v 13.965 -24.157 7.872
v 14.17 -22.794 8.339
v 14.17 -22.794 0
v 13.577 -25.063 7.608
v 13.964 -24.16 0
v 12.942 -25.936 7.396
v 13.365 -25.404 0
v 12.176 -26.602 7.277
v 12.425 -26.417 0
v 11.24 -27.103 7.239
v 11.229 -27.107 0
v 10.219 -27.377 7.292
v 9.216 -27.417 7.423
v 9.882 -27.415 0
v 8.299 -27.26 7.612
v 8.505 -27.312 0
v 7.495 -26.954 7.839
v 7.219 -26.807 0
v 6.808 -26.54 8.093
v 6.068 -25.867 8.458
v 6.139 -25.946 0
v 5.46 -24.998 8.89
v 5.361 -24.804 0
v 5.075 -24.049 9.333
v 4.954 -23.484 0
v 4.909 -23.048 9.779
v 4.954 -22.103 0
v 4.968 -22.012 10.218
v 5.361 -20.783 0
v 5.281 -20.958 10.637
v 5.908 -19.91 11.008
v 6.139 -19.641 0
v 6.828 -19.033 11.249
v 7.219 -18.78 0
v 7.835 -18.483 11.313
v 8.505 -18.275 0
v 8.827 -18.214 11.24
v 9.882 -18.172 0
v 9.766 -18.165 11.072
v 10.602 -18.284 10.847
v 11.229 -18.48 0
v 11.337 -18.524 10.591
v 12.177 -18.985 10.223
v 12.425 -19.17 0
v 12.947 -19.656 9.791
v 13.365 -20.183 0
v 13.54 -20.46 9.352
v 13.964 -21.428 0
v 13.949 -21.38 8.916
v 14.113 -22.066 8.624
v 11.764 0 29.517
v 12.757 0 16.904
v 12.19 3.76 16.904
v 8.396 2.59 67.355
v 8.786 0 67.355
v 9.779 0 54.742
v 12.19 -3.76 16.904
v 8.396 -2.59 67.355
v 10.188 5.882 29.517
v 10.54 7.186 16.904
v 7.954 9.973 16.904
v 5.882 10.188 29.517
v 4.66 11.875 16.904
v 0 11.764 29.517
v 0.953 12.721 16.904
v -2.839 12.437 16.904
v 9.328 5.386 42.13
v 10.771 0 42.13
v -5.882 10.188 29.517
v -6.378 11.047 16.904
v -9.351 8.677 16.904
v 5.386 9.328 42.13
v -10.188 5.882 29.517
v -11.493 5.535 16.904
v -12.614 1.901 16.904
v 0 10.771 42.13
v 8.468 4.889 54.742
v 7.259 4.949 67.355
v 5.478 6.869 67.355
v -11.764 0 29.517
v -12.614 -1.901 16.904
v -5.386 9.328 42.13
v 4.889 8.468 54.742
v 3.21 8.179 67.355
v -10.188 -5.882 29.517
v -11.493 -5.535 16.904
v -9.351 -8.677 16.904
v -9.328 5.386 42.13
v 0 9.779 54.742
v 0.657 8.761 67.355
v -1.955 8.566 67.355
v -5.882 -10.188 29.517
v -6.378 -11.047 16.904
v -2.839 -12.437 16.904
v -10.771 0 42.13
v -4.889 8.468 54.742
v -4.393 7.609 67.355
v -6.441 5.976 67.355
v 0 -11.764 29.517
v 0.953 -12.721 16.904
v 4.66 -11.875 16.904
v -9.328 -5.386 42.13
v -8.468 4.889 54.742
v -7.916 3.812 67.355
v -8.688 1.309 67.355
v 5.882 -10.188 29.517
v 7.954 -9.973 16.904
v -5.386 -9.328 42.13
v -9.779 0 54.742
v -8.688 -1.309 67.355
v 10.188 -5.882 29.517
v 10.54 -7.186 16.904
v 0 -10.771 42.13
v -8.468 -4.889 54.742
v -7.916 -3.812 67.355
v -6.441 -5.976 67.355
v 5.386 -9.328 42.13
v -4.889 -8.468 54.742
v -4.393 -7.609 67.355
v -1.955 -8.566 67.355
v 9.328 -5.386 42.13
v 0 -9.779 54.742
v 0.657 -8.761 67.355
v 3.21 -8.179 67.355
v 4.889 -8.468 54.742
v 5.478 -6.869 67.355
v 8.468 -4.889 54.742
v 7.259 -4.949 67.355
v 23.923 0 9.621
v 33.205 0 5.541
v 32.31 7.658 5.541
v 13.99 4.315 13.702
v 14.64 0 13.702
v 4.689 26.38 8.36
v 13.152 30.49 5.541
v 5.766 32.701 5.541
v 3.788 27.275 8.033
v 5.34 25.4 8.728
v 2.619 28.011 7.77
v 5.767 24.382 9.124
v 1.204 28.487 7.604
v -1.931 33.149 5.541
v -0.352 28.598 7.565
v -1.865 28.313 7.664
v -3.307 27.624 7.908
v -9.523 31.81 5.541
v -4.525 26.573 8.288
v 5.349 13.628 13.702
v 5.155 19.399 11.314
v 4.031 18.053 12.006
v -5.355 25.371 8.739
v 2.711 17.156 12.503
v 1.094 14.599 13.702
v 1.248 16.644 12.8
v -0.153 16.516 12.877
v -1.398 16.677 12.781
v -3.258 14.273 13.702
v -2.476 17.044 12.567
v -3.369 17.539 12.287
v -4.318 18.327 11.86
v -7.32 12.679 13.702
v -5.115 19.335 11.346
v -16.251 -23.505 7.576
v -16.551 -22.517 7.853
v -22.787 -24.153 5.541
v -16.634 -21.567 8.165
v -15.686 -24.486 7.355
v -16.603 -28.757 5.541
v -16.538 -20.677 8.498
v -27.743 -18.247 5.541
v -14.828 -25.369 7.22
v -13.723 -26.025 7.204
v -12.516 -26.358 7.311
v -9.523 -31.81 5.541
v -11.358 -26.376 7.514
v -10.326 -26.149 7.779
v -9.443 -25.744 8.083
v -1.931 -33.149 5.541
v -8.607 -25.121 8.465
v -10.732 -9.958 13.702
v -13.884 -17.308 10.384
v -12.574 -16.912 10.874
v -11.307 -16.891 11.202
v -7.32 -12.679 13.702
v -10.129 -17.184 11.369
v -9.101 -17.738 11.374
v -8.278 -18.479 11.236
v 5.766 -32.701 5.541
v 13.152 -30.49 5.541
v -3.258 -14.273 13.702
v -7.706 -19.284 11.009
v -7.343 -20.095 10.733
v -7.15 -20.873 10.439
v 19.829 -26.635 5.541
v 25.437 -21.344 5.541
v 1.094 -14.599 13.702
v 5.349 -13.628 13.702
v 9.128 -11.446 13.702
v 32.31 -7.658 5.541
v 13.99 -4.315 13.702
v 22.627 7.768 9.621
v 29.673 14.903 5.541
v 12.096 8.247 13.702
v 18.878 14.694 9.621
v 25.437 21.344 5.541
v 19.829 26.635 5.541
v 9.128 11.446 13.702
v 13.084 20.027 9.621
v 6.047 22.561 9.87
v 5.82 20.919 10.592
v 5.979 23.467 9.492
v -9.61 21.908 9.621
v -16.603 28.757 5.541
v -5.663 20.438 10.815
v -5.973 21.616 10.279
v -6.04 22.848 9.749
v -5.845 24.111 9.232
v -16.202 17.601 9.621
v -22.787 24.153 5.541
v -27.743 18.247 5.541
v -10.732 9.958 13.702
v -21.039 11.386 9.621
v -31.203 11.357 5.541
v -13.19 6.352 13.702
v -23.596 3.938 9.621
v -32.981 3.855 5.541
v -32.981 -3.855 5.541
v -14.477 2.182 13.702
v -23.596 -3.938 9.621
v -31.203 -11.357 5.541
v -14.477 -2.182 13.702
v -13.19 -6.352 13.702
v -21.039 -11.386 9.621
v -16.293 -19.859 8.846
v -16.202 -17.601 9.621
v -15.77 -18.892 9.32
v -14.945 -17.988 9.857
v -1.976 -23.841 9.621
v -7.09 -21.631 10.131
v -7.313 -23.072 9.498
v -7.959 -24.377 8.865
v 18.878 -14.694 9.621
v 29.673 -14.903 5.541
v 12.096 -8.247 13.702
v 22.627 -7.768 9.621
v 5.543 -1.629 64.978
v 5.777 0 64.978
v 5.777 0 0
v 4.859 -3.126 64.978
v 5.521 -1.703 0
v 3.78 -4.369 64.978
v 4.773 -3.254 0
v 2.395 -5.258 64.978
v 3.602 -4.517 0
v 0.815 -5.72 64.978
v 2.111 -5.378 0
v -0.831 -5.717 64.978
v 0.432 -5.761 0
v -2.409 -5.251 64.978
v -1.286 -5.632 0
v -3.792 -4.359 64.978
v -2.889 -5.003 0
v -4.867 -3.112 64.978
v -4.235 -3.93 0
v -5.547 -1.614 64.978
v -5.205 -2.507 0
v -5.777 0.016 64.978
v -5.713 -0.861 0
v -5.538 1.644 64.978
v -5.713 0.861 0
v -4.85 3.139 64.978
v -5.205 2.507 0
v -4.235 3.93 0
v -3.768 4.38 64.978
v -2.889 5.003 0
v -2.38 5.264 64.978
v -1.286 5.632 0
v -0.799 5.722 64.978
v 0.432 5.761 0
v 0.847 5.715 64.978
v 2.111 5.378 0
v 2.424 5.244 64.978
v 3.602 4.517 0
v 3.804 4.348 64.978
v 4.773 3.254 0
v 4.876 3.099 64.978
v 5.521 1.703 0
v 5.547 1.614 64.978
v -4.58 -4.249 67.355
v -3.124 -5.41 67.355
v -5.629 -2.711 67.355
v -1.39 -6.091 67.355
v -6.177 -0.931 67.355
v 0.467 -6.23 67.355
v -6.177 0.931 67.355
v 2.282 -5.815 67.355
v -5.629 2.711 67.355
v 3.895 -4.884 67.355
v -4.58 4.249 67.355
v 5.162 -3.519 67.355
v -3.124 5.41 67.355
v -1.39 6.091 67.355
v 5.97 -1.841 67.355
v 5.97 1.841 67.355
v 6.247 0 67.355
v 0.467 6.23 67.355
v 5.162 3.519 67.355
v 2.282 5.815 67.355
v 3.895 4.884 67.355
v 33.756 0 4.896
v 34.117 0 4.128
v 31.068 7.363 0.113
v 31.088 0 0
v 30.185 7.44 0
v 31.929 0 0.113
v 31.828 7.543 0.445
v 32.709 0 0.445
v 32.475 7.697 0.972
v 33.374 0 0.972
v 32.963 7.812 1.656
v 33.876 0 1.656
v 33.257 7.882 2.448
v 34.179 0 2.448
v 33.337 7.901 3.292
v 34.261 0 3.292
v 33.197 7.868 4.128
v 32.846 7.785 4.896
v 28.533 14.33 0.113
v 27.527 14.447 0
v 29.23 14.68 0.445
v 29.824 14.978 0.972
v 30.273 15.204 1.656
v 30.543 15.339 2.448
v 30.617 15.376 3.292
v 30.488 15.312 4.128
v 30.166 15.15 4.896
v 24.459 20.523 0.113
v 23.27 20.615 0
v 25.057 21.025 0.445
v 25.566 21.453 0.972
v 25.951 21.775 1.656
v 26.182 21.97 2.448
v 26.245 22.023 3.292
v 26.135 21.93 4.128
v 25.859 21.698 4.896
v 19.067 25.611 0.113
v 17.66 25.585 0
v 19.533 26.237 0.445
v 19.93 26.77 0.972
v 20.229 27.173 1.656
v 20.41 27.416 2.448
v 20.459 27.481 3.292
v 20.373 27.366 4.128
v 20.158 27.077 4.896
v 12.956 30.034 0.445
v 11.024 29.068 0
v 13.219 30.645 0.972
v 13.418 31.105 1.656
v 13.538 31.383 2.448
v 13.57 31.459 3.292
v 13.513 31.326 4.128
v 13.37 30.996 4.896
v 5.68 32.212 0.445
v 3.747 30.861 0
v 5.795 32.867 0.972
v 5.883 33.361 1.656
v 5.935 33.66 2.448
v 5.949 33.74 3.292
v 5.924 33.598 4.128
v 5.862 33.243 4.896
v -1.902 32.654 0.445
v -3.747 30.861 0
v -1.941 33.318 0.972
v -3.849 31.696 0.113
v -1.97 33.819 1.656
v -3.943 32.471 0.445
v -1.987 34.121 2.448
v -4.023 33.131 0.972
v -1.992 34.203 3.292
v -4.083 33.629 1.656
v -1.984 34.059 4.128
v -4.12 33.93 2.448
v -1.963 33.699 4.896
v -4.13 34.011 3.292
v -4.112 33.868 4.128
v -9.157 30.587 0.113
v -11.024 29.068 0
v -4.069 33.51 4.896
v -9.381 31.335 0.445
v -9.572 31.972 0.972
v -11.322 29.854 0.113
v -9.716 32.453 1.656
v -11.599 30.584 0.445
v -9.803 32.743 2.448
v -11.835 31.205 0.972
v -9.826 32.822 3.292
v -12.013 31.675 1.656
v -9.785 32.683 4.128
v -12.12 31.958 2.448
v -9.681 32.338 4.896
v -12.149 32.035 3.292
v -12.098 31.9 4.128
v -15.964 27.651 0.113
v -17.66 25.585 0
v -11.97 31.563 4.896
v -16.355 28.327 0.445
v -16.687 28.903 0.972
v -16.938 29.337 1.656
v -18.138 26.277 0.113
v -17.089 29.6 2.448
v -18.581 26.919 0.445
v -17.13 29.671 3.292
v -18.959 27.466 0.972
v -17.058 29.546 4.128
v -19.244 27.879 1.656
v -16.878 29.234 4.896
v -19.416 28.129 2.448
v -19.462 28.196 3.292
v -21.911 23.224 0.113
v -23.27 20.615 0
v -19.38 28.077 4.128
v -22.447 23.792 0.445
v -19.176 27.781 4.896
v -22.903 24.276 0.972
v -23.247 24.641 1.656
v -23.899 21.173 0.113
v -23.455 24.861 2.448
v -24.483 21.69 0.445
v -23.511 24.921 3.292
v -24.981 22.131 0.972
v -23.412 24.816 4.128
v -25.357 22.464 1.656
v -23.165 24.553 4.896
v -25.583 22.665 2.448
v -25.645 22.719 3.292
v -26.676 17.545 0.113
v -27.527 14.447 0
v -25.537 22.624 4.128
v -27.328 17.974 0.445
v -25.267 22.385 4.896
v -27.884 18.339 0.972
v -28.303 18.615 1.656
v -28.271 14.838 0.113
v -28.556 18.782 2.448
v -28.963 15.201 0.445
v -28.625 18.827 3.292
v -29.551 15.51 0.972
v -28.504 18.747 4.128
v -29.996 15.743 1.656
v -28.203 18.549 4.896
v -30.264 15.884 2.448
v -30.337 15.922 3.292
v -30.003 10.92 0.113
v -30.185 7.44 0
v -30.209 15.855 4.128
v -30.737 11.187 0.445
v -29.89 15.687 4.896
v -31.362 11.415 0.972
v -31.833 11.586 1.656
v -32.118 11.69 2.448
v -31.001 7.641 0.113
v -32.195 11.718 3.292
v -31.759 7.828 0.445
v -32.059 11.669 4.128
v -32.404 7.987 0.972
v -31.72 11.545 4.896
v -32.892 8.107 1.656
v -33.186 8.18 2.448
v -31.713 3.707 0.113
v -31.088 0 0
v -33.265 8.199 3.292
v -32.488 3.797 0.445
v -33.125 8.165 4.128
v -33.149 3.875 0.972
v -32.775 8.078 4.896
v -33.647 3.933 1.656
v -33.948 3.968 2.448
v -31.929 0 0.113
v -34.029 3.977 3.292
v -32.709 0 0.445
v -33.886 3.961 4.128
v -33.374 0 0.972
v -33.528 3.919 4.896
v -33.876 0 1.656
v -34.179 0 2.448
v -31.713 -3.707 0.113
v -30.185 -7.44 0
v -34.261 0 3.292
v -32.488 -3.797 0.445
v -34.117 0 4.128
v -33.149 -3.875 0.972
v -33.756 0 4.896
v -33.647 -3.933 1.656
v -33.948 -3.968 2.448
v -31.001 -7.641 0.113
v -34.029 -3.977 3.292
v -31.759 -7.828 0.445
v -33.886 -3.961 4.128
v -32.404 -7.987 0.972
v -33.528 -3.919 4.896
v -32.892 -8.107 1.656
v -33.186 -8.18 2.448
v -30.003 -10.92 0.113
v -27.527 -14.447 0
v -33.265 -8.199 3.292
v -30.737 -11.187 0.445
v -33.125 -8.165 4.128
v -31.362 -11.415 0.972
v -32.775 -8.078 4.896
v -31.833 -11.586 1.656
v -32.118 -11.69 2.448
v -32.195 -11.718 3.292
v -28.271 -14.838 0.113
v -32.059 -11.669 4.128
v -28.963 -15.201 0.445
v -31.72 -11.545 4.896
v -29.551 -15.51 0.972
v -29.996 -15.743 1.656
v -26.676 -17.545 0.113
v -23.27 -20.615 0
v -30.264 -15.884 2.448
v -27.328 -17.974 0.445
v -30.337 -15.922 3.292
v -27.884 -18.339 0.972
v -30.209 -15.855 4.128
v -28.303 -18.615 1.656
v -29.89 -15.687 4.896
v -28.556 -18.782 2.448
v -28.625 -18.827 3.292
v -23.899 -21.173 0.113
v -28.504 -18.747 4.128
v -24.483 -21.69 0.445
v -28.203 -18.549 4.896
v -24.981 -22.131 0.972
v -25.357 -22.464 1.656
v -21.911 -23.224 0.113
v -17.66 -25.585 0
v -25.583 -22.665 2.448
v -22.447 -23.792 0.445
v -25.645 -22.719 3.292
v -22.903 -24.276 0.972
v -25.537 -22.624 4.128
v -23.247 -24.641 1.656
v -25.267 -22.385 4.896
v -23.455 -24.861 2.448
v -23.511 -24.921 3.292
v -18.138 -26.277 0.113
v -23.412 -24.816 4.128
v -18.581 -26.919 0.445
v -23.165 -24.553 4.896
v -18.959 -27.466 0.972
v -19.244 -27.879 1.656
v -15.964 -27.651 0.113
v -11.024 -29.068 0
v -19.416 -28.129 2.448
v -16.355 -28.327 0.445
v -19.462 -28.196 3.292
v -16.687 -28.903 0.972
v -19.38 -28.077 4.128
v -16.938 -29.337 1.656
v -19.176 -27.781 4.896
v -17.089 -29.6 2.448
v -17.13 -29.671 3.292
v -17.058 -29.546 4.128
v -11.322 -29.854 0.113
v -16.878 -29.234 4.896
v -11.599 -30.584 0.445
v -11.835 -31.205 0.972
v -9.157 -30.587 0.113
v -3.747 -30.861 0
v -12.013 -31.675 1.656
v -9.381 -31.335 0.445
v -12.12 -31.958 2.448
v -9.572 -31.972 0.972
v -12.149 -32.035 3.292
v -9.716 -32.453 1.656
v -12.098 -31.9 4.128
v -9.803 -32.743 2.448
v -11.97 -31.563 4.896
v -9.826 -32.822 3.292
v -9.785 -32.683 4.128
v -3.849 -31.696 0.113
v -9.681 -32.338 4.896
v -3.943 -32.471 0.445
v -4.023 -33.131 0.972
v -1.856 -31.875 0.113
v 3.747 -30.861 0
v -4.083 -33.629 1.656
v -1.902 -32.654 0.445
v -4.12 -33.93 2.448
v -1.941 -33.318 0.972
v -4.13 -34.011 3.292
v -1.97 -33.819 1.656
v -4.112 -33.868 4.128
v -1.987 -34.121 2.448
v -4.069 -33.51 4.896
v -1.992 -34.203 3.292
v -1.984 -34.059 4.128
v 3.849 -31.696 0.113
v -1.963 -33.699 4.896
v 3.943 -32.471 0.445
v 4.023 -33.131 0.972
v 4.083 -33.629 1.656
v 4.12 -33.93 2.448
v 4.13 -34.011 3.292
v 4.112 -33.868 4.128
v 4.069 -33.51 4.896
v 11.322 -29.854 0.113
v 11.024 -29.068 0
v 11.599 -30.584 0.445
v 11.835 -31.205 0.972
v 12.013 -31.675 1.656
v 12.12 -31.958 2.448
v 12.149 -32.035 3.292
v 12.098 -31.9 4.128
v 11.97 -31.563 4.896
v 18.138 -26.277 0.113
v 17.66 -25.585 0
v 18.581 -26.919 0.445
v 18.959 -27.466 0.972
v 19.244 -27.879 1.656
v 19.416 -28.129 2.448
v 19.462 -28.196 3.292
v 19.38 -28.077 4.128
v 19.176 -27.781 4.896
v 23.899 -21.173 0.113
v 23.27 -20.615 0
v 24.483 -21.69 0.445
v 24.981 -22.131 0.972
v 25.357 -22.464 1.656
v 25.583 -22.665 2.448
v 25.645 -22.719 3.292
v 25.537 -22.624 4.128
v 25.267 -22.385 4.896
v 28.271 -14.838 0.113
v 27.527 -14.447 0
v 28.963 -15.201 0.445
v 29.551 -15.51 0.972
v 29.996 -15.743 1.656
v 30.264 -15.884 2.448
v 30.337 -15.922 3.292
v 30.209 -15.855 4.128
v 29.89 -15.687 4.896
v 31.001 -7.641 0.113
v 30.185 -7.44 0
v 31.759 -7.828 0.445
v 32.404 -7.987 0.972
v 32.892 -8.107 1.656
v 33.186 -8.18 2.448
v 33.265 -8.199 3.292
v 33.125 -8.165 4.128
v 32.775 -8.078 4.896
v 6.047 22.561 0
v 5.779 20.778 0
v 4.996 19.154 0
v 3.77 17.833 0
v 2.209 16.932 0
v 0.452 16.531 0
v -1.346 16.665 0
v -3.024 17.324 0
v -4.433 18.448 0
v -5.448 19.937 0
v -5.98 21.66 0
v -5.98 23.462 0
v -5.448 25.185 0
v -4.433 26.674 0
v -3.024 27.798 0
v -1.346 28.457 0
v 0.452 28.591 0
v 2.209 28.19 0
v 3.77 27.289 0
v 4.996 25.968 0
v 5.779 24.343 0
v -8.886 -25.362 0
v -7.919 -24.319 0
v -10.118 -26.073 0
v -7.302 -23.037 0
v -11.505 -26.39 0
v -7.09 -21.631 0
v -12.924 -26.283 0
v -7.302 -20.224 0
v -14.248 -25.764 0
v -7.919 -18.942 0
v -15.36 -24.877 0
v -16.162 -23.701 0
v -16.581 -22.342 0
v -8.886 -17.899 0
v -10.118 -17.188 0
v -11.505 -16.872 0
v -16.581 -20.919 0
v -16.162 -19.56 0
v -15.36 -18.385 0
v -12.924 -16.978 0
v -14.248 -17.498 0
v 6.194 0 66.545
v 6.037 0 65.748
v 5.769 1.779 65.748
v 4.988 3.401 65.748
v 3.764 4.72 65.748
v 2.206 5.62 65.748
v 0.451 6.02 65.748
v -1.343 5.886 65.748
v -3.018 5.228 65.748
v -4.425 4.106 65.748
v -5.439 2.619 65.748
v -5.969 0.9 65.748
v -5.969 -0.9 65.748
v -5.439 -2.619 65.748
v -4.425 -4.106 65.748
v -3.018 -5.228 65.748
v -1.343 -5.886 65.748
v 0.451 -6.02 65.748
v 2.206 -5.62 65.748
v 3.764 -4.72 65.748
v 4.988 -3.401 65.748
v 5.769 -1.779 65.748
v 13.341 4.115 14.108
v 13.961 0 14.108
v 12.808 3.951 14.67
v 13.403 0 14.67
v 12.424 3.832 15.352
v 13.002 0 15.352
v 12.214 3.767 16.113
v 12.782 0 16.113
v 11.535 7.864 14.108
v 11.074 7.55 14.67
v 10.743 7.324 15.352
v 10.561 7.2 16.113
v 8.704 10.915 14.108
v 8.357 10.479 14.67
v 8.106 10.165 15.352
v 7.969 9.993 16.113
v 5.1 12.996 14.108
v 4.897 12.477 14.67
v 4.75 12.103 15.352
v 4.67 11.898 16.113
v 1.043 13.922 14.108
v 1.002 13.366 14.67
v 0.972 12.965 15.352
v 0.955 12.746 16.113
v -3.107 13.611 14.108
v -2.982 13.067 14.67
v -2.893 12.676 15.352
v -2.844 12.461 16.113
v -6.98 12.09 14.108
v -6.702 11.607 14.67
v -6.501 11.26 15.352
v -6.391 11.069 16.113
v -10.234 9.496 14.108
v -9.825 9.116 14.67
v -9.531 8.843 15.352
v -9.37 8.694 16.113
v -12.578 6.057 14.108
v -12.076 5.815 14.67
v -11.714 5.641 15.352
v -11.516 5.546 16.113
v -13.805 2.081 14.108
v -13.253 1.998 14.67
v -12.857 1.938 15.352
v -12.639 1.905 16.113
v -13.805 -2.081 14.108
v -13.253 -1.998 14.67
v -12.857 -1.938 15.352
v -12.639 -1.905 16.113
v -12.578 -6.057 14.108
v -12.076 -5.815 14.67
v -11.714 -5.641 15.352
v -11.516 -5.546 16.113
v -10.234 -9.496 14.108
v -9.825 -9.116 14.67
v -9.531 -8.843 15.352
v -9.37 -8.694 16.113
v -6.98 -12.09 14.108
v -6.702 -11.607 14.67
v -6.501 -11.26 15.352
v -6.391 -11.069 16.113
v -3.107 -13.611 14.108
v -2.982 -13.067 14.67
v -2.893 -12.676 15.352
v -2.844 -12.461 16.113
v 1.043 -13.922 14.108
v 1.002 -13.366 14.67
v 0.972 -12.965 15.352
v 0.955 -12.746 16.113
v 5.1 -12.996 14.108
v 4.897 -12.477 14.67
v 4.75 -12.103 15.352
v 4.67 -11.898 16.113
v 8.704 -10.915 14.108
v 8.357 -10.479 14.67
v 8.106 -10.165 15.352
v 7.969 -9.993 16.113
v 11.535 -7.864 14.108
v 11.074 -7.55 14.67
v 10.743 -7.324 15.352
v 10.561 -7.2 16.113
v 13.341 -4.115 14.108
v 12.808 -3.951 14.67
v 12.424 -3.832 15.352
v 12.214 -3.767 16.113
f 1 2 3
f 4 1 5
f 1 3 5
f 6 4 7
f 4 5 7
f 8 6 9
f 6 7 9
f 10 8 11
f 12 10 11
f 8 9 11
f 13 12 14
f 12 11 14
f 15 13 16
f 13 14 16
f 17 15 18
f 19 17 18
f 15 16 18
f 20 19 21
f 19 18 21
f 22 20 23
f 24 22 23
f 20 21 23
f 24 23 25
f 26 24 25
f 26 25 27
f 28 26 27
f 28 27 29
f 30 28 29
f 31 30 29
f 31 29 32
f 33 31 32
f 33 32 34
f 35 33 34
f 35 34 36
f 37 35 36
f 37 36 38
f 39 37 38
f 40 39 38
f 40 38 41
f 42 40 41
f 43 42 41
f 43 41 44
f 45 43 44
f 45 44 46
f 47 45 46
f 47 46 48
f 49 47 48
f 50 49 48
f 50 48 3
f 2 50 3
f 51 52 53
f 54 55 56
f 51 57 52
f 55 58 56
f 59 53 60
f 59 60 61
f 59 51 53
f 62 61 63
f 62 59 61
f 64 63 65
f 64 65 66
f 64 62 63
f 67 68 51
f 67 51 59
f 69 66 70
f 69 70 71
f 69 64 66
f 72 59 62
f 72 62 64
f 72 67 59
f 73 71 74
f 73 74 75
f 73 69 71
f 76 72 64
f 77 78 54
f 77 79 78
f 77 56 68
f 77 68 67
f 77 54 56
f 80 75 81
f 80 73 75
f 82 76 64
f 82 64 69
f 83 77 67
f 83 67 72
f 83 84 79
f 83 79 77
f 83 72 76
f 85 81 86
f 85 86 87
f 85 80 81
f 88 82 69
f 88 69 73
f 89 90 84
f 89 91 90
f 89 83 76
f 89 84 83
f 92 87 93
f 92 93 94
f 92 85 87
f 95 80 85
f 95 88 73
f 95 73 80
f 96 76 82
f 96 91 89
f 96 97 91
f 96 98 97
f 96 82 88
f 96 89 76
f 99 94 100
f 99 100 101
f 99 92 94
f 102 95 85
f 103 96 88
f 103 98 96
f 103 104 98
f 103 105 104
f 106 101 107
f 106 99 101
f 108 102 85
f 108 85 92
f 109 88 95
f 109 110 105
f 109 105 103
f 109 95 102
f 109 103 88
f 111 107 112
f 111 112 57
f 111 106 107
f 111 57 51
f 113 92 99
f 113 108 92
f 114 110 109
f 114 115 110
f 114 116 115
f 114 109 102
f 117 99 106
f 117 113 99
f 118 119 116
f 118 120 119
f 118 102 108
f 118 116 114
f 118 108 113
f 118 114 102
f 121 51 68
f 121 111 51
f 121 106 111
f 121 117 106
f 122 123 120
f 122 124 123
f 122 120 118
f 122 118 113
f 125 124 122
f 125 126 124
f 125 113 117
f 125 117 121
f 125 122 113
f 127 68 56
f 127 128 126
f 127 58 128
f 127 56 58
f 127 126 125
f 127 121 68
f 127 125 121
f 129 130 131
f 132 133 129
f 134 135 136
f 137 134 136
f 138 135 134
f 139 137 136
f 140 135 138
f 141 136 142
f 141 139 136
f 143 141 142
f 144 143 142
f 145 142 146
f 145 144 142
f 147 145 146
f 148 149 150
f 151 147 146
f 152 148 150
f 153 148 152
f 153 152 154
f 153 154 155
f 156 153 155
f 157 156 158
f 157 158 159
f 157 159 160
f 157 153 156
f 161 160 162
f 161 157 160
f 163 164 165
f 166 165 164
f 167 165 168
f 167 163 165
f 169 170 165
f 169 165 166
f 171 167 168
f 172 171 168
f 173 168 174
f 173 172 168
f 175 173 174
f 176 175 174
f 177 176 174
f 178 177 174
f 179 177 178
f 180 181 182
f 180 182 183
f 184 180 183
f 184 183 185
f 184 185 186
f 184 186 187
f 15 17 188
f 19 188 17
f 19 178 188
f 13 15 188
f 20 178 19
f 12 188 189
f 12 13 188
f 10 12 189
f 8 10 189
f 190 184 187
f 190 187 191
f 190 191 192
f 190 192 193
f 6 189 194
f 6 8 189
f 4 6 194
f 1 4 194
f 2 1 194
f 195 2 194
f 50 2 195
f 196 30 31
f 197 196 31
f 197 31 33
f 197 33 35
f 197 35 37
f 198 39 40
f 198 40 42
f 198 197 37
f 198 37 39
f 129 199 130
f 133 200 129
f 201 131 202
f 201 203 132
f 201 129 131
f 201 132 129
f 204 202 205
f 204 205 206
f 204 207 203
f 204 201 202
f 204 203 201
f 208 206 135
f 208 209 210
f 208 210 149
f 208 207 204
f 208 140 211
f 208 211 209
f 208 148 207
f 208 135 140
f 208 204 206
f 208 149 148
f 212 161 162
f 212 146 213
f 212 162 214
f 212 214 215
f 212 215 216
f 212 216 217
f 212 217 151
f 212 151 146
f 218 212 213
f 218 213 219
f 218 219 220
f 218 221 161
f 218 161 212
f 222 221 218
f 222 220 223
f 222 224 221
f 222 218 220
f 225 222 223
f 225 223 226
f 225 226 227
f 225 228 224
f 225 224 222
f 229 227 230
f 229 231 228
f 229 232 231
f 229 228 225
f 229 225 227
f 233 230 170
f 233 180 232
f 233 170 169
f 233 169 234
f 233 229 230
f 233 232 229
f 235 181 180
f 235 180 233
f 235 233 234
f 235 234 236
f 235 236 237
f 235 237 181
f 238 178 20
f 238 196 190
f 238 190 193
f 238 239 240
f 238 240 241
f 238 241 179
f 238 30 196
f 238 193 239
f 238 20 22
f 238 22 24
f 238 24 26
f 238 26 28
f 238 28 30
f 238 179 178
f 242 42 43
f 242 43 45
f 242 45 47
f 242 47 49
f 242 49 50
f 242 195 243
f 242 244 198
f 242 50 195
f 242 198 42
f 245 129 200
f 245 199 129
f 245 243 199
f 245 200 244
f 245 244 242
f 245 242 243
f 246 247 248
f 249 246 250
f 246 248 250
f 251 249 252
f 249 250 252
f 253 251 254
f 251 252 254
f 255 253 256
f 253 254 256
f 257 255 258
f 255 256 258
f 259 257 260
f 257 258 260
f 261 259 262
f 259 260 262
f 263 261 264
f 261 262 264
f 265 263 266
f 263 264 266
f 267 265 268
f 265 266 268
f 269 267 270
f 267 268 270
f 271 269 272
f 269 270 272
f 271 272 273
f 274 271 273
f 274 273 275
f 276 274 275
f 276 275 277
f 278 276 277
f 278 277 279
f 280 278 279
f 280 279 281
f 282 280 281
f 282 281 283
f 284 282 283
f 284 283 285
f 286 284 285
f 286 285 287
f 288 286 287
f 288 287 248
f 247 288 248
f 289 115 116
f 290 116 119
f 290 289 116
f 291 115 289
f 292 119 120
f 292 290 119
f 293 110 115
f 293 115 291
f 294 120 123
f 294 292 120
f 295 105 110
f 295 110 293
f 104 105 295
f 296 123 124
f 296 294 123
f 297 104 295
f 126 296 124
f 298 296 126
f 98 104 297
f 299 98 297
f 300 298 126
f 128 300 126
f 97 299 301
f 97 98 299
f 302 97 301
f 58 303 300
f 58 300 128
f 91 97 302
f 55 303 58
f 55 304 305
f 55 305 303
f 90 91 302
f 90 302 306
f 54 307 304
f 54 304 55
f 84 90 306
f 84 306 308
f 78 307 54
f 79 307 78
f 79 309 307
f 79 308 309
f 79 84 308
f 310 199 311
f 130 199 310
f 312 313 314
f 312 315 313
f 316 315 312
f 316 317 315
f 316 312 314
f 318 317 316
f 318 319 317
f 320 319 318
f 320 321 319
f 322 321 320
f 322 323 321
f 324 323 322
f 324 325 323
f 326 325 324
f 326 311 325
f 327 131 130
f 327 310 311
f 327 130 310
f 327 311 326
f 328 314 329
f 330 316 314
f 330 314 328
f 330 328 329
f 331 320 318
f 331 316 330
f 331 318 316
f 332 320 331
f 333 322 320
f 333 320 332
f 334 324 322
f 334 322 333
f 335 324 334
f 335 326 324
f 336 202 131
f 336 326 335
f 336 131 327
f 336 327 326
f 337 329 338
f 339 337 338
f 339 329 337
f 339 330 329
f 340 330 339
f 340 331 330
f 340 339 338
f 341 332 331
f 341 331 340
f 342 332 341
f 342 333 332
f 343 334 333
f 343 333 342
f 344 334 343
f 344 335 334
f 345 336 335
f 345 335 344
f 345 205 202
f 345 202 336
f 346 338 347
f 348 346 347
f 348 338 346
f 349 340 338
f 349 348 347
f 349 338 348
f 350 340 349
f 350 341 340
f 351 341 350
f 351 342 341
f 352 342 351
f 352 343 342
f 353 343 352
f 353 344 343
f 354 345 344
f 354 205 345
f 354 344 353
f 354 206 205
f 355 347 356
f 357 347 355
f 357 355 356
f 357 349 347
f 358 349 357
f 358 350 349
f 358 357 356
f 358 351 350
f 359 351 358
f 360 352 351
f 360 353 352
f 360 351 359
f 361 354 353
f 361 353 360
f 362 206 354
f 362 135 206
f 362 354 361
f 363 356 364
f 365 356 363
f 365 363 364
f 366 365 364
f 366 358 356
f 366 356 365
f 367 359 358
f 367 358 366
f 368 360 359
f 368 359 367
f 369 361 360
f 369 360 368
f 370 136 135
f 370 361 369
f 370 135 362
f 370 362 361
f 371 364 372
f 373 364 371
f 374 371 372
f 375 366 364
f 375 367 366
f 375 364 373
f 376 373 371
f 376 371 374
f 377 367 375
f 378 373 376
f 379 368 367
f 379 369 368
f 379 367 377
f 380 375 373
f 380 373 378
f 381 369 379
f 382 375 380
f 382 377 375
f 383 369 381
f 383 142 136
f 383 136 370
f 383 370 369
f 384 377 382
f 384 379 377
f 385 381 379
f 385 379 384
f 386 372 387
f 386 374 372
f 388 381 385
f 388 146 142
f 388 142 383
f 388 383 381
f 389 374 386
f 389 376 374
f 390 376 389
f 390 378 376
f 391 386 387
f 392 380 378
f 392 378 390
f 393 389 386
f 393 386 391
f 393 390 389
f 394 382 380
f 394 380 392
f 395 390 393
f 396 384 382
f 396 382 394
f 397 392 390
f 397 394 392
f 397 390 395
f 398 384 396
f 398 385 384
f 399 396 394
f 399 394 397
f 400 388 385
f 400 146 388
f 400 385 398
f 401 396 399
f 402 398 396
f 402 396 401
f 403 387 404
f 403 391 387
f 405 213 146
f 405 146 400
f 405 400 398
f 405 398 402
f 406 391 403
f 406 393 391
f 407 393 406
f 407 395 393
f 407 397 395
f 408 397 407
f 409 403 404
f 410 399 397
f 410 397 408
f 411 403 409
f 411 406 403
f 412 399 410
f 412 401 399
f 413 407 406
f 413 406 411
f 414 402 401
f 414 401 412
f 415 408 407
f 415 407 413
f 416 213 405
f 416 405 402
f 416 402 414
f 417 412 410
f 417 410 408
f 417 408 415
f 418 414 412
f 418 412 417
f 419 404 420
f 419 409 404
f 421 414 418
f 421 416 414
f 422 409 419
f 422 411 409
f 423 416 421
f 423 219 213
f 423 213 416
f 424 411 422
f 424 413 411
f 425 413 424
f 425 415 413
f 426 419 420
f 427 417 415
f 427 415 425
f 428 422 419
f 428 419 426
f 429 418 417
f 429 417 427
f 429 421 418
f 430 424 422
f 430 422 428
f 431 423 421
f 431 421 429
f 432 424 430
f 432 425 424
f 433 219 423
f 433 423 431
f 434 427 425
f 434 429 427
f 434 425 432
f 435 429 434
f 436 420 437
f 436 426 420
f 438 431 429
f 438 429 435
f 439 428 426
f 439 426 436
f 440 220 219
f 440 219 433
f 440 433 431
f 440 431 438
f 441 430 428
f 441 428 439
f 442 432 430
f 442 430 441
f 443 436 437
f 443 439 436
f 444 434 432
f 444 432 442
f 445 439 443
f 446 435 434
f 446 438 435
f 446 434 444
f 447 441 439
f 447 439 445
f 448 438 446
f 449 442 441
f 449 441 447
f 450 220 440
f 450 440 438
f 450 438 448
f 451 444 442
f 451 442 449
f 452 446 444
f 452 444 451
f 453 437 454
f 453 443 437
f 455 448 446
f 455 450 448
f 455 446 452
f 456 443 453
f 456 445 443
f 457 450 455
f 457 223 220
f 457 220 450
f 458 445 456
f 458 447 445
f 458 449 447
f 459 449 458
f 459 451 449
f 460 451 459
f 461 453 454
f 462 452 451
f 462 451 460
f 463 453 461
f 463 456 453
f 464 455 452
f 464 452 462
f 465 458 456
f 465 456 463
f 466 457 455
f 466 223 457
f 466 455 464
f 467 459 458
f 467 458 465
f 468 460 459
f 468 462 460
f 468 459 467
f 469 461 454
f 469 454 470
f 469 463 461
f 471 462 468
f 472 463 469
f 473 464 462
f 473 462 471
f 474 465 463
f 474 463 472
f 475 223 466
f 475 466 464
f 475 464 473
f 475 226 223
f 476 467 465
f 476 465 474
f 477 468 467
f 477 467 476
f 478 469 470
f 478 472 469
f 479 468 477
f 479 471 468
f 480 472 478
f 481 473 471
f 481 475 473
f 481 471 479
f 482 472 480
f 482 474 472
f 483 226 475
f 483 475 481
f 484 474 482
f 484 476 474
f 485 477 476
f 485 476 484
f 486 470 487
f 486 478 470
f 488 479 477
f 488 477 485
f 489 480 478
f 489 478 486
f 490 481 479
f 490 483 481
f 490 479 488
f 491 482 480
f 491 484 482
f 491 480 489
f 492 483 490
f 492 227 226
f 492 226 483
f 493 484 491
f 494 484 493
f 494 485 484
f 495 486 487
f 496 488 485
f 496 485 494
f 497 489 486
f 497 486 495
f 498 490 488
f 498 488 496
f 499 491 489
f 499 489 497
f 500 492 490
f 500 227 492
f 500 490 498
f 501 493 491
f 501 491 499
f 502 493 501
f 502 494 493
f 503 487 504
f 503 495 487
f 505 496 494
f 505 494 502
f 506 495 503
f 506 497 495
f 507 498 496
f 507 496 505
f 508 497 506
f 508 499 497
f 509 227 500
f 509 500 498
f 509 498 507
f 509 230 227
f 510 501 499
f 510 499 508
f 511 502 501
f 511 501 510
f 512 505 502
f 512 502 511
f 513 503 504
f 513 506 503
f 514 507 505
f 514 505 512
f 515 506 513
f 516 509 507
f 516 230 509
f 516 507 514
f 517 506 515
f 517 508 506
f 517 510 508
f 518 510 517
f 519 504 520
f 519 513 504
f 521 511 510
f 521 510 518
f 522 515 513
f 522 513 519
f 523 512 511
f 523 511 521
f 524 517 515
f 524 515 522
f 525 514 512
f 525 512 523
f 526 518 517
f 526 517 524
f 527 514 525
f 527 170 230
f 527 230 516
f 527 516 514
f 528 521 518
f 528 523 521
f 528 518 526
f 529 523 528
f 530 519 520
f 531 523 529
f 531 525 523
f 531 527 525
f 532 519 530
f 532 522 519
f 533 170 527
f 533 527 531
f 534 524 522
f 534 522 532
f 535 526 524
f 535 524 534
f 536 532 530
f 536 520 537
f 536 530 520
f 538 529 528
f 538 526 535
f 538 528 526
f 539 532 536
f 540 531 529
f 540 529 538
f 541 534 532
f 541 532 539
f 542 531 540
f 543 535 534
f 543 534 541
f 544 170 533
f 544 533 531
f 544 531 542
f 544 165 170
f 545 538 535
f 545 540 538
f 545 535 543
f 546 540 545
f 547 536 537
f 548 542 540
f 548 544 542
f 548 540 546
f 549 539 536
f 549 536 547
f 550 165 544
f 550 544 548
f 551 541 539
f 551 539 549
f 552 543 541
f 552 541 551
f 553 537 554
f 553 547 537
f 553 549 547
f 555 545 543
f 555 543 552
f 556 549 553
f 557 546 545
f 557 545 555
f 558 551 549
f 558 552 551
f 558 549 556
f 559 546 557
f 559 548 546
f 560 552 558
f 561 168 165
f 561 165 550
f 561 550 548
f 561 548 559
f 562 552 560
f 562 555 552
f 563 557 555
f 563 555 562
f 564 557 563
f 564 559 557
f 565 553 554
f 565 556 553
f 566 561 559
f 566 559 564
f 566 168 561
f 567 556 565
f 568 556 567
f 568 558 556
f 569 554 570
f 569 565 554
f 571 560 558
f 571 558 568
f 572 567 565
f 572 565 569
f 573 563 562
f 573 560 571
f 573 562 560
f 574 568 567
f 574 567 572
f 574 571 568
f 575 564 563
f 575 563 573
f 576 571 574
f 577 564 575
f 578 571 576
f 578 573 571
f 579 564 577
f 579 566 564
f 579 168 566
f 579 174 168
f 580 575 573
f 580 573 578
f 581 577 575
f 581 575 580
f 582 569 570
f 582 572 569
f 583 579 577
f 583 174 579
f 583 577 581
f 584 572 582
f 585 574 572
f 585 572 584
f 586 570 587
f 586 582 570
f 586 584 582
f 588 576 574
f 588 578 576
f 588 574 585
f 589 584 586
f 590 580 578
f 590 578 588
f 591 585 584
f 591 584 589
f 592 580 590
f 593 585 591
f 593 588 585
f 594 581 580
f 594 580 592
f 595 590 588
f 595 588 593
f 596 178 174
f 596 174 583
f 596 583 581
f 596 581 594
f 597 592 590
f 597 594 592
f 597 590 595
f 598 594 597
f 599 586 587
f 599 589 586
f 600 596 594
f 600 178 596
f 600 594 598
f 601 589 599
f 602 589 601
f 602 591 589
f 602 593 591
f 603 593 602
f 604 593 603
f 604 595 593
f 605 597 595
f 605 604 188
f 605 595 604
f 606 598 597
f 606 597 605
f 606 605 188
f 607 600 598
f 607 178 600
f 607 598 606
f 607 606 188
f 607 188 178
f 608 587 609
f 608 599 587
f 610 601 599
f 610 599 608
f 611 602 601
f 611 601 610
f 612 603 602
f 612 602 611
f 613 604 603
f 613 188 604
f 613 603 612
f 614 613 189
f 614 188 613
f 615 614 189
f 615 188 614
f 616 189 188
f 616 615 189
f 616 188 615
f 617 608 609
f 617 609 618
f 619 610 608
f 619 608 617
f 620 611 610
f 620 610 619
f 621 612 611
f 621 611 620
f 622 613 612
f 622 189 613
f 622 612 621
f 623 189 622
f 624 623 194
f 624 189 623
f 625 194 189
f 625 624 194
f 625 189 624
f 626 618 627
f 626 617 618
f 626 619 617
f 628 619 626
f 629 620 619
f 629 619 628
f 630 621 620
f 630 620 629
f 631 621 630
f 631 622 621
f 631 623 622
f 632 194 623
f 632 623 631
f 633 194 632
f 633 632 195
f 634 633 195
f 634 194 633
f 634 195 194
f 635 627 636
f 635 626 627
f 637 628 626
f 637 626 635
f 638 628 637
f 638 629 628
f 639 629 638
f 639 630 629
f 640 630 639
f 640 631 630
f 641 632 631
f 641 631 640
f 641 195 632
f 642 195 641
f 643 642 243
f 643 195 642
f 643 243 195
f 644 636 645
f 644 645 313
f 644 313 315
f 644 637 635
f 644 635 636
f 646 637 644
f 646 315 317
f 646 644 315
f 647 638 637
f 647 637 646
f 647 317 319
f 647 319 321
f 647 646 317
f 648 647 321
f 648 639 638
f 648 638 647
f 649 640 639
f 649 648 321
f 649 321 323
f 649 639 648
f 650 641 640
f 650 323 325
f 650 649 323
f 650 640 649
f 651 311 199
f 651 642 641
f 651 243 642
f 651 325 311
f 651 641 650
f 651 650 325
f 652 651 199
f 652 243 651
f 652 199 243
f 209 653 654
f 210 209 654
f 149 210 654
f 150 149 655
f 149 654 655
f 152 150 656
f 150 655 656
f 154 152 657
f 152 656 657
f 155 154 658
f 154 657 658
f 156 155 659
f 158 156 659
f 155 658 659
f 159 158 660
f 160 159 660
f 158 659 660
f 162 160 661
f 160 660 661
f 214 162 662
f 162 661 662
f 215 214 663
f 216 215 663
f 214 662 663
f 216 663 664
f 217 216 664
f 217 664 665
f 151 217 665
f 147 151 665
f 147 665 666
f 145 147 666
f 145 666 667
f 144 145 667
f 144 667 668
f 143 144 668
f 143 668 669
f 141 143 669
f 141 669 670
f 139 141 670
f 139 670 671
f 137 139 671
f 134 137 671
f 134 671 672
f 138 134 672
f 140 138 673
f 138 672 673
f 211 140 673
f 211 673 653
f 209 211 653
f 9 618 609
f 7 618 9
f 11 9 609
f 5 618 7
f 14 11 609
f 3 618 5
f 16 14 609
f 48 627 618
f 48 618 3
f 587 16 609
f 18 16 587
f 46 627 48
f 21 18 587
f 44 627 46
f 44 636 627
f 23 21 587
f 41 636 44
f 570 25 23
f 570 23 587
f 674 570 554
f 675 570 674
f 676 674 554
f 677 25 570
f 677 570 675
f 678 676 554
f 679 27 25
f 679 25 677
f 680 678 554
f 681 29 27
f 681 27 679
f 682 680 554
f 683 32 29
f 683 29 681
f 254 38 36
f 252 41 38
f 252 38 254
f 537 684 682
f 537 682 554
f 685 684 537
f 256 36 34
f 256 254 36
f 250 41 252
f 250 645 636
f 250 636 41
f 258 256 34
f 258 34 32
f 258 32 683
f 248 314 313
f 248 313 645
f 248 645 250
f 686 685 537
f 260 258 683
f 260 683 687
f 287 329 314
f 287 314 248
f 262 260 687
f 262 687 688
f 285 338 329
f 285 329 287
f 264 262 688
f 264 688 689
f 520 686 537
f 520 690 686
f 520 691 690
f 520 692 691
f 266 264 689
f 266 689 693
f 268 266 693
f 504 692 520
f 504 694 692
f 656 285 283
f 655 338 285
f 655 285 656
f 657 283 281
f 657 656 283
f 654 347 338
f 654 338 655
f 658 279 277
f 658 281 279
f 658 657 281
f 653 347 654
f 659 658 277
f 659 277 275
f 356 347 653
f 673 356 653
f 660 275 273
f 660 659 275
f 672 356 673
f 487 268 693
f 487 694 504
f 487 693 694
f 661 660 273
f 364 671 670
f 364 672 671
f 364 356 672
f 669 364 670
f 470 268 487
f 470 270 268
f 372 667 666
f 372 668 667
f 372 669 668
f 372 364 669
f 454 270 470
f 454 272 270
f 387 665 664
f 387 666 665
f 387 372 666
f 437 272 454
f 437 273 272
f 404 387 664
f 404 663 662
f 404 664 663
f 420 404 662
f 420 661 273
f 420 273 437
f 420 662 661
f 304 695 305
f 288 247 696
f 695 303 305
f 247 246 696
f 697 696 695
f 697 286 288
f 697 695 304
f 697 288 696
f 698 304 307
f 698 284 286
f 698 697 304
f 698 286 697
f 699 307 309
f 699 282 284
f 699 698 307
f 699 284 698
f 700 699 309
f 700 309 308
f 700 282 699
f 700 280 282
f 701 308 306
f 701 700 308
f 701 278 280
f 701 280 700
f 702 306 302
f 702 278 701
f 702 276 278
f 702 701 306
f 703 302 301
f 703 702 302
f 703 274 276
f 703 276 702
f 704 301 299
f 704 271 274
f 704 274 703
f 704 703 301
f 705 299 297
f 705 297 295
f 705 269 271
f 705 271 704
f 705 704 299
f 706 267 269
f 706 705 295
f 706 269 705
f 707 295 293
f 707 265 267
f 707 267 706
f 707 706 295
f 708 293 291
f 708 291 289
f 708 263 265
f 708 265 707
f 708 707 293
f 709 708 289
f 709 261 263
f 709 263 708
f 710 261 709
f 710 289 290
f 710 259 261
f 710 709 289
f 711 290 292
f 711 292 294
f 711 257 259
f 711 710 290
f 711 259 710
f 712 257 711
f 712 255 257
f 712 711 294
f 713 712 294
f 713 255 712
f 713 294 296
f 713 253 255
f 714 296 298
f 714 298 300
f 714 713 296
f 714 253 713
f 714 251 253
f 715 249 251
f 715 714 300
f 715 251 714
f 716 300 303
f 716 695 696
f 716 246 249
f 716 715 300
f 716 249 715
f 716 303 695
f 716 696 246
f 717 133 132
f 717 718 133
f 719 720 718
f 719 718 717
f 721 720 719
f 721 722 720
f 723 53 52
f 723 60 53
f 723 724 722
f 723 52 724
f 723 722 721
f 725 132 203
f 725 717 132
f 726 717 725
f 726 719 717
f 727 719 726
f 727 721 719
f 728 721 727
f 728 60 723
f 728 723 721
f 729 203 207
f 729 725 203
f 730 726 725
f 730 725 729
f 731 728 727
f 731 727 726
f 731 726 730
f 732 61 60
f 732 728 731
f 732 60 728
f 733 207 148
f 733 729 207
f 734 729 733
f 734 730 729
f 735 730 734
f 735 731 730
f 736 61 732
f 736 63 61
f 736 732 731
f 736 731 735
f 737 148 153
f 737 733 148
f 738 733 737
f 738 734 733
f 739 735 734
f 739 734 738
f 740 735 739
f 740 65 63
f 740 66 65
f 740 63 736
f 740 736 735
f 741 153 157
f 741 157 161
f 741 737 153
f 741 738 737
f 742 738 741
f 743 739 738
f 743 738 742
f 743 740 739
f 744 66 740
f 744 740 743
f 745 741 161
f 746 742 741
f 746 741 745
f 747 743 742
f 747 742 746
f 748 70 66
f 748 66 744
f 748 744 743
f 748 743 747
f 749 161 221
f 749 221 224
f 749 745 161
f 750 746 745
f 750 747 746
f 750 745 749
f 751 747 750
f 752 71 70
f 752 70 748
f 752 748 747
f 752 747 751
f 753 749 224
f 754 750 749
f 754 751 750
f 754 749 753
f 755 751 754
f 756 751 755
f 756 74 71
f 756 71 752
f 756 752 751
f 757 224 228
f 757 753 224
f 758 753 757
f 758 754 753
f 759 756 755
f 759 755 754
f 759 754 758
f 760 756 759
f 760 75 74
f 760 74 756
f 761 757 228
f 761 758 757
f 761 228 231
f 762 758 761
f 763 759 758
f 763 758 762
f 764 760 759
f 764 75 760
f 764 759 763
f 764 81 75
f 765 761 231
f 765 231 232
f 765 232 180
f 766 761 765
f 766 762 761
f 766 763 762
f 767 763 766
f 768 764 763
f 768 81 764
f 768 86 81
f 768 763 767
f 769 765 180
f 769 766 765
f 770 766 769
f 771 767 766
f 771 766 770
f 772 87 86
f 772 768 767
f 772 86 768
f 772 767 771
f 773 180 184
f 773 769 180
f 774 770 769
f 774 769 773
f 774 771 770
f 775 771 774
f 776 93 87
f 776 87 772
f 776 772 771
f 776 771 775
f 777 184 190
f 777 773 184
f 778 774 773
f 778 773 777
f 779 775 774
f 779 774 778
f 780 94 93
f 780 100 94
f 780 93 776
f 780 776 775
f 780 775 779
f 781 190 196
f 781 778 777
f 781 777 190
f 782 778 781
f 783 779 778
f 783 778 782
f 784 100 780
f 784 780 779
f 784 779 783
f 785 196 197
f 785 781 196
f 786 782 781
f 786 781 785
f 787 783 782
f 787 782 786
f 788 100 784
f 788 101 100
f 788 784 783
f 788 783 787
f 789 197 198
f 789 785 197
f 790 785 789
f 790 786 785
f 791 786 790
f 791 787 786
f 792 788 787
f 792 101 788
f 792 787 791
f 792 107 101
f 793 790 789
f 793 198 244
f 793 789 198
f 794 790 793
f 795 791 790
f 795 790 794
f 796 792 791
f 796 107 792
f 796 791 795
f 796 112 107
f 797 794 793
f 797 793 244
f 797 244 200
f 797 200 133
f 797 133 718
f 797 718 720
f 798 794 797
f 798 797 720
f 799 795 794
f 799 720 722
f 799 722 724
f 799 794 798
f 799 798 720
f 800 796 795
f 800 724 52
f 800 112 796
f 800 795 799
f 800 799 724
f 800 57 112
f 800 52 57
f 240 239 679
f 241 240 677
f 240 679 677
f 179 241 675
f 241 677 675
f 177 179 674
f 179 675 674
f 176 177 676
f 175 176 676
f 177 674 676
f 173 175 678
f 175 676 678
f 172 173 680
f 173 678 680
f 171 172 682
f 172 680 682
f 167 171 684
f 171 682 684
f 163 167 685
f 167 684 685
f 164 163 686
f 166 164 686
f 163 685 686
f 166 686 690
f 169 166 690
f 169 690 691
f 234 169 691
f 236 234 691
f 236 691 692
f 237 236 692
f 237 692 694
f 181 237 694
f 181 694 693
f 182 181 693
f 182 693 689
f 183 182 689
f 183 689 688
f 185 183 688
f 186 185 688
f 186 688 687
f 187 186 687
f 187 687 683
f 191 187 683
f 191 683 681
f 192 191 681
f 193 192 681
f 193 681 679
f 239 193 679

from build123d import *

# Parameters (mm, degrees)
F2_R     = 5.777347
F3_DEPTH = 87.884
F4_R     = 4.634266
F4_R_2   = 4.772292
F4_R_3   = 6.047266
F5_DEPTH = 25.4


with BuildPart() as f1:
    # F0 (on Front) → F1 (revolve)
    with BuildSketch(Plane.XZ):
        with BuildLine():
            Line((0, 61.108096), (0, 0))
            Line((0, 0), (31.088113, 0))
            ThreePointArc((31.088113, 0), (34.053969, 2.04172), (33.205369, 5.540978))
            Line((33.205369, 5.540978), (14.640065, 13.701916))
            ThreePointArc((14.640065, 13.701916), (13.181096, 14.998702), (12.756515, 16.903952))
            Line((12.756515, 16.903952), (8.78591, 67.355268))
            Line((8.78591, 67.355268), (6.247173, 67.355268))
            ThreePointArc((6.247173, 67.355268), (4.417418, 62.93785), (0, 61.108096))
        make_face()
    revolve(axis=Axis((0, 0, 30.554048), (0, 0, 1)))

    # F2 (on face) → F3 (cut)
    with BuildSketch(Plane(origin=(0, 0, 0), x_dir=(1, 0, 0), z_dir=(0, 0, -1))):
        Circle(F2_R)
    extrude(amount=-F3_DEPTH, mode=Mode.SUBTRACT)

    # F4 (on face) → F5 (cut)
    with BuildSketch(Plane(origin=(0, 0, 0), x_dir=(1, 0, 0), z_dir=(0, 0, -1))):
        with Locations((9.536076, 22.793546)):
            Circle(F4_R)
        with Locations((-11.861948, 21.630611)):
            Circle(F4_R_2)
        with Locations((0, -22.560958)):
            Circle(F4_R_3)
    extrude(amount=-F5_DEPTH, mode=Mode.SUBTRACT)


solid = f1.part
